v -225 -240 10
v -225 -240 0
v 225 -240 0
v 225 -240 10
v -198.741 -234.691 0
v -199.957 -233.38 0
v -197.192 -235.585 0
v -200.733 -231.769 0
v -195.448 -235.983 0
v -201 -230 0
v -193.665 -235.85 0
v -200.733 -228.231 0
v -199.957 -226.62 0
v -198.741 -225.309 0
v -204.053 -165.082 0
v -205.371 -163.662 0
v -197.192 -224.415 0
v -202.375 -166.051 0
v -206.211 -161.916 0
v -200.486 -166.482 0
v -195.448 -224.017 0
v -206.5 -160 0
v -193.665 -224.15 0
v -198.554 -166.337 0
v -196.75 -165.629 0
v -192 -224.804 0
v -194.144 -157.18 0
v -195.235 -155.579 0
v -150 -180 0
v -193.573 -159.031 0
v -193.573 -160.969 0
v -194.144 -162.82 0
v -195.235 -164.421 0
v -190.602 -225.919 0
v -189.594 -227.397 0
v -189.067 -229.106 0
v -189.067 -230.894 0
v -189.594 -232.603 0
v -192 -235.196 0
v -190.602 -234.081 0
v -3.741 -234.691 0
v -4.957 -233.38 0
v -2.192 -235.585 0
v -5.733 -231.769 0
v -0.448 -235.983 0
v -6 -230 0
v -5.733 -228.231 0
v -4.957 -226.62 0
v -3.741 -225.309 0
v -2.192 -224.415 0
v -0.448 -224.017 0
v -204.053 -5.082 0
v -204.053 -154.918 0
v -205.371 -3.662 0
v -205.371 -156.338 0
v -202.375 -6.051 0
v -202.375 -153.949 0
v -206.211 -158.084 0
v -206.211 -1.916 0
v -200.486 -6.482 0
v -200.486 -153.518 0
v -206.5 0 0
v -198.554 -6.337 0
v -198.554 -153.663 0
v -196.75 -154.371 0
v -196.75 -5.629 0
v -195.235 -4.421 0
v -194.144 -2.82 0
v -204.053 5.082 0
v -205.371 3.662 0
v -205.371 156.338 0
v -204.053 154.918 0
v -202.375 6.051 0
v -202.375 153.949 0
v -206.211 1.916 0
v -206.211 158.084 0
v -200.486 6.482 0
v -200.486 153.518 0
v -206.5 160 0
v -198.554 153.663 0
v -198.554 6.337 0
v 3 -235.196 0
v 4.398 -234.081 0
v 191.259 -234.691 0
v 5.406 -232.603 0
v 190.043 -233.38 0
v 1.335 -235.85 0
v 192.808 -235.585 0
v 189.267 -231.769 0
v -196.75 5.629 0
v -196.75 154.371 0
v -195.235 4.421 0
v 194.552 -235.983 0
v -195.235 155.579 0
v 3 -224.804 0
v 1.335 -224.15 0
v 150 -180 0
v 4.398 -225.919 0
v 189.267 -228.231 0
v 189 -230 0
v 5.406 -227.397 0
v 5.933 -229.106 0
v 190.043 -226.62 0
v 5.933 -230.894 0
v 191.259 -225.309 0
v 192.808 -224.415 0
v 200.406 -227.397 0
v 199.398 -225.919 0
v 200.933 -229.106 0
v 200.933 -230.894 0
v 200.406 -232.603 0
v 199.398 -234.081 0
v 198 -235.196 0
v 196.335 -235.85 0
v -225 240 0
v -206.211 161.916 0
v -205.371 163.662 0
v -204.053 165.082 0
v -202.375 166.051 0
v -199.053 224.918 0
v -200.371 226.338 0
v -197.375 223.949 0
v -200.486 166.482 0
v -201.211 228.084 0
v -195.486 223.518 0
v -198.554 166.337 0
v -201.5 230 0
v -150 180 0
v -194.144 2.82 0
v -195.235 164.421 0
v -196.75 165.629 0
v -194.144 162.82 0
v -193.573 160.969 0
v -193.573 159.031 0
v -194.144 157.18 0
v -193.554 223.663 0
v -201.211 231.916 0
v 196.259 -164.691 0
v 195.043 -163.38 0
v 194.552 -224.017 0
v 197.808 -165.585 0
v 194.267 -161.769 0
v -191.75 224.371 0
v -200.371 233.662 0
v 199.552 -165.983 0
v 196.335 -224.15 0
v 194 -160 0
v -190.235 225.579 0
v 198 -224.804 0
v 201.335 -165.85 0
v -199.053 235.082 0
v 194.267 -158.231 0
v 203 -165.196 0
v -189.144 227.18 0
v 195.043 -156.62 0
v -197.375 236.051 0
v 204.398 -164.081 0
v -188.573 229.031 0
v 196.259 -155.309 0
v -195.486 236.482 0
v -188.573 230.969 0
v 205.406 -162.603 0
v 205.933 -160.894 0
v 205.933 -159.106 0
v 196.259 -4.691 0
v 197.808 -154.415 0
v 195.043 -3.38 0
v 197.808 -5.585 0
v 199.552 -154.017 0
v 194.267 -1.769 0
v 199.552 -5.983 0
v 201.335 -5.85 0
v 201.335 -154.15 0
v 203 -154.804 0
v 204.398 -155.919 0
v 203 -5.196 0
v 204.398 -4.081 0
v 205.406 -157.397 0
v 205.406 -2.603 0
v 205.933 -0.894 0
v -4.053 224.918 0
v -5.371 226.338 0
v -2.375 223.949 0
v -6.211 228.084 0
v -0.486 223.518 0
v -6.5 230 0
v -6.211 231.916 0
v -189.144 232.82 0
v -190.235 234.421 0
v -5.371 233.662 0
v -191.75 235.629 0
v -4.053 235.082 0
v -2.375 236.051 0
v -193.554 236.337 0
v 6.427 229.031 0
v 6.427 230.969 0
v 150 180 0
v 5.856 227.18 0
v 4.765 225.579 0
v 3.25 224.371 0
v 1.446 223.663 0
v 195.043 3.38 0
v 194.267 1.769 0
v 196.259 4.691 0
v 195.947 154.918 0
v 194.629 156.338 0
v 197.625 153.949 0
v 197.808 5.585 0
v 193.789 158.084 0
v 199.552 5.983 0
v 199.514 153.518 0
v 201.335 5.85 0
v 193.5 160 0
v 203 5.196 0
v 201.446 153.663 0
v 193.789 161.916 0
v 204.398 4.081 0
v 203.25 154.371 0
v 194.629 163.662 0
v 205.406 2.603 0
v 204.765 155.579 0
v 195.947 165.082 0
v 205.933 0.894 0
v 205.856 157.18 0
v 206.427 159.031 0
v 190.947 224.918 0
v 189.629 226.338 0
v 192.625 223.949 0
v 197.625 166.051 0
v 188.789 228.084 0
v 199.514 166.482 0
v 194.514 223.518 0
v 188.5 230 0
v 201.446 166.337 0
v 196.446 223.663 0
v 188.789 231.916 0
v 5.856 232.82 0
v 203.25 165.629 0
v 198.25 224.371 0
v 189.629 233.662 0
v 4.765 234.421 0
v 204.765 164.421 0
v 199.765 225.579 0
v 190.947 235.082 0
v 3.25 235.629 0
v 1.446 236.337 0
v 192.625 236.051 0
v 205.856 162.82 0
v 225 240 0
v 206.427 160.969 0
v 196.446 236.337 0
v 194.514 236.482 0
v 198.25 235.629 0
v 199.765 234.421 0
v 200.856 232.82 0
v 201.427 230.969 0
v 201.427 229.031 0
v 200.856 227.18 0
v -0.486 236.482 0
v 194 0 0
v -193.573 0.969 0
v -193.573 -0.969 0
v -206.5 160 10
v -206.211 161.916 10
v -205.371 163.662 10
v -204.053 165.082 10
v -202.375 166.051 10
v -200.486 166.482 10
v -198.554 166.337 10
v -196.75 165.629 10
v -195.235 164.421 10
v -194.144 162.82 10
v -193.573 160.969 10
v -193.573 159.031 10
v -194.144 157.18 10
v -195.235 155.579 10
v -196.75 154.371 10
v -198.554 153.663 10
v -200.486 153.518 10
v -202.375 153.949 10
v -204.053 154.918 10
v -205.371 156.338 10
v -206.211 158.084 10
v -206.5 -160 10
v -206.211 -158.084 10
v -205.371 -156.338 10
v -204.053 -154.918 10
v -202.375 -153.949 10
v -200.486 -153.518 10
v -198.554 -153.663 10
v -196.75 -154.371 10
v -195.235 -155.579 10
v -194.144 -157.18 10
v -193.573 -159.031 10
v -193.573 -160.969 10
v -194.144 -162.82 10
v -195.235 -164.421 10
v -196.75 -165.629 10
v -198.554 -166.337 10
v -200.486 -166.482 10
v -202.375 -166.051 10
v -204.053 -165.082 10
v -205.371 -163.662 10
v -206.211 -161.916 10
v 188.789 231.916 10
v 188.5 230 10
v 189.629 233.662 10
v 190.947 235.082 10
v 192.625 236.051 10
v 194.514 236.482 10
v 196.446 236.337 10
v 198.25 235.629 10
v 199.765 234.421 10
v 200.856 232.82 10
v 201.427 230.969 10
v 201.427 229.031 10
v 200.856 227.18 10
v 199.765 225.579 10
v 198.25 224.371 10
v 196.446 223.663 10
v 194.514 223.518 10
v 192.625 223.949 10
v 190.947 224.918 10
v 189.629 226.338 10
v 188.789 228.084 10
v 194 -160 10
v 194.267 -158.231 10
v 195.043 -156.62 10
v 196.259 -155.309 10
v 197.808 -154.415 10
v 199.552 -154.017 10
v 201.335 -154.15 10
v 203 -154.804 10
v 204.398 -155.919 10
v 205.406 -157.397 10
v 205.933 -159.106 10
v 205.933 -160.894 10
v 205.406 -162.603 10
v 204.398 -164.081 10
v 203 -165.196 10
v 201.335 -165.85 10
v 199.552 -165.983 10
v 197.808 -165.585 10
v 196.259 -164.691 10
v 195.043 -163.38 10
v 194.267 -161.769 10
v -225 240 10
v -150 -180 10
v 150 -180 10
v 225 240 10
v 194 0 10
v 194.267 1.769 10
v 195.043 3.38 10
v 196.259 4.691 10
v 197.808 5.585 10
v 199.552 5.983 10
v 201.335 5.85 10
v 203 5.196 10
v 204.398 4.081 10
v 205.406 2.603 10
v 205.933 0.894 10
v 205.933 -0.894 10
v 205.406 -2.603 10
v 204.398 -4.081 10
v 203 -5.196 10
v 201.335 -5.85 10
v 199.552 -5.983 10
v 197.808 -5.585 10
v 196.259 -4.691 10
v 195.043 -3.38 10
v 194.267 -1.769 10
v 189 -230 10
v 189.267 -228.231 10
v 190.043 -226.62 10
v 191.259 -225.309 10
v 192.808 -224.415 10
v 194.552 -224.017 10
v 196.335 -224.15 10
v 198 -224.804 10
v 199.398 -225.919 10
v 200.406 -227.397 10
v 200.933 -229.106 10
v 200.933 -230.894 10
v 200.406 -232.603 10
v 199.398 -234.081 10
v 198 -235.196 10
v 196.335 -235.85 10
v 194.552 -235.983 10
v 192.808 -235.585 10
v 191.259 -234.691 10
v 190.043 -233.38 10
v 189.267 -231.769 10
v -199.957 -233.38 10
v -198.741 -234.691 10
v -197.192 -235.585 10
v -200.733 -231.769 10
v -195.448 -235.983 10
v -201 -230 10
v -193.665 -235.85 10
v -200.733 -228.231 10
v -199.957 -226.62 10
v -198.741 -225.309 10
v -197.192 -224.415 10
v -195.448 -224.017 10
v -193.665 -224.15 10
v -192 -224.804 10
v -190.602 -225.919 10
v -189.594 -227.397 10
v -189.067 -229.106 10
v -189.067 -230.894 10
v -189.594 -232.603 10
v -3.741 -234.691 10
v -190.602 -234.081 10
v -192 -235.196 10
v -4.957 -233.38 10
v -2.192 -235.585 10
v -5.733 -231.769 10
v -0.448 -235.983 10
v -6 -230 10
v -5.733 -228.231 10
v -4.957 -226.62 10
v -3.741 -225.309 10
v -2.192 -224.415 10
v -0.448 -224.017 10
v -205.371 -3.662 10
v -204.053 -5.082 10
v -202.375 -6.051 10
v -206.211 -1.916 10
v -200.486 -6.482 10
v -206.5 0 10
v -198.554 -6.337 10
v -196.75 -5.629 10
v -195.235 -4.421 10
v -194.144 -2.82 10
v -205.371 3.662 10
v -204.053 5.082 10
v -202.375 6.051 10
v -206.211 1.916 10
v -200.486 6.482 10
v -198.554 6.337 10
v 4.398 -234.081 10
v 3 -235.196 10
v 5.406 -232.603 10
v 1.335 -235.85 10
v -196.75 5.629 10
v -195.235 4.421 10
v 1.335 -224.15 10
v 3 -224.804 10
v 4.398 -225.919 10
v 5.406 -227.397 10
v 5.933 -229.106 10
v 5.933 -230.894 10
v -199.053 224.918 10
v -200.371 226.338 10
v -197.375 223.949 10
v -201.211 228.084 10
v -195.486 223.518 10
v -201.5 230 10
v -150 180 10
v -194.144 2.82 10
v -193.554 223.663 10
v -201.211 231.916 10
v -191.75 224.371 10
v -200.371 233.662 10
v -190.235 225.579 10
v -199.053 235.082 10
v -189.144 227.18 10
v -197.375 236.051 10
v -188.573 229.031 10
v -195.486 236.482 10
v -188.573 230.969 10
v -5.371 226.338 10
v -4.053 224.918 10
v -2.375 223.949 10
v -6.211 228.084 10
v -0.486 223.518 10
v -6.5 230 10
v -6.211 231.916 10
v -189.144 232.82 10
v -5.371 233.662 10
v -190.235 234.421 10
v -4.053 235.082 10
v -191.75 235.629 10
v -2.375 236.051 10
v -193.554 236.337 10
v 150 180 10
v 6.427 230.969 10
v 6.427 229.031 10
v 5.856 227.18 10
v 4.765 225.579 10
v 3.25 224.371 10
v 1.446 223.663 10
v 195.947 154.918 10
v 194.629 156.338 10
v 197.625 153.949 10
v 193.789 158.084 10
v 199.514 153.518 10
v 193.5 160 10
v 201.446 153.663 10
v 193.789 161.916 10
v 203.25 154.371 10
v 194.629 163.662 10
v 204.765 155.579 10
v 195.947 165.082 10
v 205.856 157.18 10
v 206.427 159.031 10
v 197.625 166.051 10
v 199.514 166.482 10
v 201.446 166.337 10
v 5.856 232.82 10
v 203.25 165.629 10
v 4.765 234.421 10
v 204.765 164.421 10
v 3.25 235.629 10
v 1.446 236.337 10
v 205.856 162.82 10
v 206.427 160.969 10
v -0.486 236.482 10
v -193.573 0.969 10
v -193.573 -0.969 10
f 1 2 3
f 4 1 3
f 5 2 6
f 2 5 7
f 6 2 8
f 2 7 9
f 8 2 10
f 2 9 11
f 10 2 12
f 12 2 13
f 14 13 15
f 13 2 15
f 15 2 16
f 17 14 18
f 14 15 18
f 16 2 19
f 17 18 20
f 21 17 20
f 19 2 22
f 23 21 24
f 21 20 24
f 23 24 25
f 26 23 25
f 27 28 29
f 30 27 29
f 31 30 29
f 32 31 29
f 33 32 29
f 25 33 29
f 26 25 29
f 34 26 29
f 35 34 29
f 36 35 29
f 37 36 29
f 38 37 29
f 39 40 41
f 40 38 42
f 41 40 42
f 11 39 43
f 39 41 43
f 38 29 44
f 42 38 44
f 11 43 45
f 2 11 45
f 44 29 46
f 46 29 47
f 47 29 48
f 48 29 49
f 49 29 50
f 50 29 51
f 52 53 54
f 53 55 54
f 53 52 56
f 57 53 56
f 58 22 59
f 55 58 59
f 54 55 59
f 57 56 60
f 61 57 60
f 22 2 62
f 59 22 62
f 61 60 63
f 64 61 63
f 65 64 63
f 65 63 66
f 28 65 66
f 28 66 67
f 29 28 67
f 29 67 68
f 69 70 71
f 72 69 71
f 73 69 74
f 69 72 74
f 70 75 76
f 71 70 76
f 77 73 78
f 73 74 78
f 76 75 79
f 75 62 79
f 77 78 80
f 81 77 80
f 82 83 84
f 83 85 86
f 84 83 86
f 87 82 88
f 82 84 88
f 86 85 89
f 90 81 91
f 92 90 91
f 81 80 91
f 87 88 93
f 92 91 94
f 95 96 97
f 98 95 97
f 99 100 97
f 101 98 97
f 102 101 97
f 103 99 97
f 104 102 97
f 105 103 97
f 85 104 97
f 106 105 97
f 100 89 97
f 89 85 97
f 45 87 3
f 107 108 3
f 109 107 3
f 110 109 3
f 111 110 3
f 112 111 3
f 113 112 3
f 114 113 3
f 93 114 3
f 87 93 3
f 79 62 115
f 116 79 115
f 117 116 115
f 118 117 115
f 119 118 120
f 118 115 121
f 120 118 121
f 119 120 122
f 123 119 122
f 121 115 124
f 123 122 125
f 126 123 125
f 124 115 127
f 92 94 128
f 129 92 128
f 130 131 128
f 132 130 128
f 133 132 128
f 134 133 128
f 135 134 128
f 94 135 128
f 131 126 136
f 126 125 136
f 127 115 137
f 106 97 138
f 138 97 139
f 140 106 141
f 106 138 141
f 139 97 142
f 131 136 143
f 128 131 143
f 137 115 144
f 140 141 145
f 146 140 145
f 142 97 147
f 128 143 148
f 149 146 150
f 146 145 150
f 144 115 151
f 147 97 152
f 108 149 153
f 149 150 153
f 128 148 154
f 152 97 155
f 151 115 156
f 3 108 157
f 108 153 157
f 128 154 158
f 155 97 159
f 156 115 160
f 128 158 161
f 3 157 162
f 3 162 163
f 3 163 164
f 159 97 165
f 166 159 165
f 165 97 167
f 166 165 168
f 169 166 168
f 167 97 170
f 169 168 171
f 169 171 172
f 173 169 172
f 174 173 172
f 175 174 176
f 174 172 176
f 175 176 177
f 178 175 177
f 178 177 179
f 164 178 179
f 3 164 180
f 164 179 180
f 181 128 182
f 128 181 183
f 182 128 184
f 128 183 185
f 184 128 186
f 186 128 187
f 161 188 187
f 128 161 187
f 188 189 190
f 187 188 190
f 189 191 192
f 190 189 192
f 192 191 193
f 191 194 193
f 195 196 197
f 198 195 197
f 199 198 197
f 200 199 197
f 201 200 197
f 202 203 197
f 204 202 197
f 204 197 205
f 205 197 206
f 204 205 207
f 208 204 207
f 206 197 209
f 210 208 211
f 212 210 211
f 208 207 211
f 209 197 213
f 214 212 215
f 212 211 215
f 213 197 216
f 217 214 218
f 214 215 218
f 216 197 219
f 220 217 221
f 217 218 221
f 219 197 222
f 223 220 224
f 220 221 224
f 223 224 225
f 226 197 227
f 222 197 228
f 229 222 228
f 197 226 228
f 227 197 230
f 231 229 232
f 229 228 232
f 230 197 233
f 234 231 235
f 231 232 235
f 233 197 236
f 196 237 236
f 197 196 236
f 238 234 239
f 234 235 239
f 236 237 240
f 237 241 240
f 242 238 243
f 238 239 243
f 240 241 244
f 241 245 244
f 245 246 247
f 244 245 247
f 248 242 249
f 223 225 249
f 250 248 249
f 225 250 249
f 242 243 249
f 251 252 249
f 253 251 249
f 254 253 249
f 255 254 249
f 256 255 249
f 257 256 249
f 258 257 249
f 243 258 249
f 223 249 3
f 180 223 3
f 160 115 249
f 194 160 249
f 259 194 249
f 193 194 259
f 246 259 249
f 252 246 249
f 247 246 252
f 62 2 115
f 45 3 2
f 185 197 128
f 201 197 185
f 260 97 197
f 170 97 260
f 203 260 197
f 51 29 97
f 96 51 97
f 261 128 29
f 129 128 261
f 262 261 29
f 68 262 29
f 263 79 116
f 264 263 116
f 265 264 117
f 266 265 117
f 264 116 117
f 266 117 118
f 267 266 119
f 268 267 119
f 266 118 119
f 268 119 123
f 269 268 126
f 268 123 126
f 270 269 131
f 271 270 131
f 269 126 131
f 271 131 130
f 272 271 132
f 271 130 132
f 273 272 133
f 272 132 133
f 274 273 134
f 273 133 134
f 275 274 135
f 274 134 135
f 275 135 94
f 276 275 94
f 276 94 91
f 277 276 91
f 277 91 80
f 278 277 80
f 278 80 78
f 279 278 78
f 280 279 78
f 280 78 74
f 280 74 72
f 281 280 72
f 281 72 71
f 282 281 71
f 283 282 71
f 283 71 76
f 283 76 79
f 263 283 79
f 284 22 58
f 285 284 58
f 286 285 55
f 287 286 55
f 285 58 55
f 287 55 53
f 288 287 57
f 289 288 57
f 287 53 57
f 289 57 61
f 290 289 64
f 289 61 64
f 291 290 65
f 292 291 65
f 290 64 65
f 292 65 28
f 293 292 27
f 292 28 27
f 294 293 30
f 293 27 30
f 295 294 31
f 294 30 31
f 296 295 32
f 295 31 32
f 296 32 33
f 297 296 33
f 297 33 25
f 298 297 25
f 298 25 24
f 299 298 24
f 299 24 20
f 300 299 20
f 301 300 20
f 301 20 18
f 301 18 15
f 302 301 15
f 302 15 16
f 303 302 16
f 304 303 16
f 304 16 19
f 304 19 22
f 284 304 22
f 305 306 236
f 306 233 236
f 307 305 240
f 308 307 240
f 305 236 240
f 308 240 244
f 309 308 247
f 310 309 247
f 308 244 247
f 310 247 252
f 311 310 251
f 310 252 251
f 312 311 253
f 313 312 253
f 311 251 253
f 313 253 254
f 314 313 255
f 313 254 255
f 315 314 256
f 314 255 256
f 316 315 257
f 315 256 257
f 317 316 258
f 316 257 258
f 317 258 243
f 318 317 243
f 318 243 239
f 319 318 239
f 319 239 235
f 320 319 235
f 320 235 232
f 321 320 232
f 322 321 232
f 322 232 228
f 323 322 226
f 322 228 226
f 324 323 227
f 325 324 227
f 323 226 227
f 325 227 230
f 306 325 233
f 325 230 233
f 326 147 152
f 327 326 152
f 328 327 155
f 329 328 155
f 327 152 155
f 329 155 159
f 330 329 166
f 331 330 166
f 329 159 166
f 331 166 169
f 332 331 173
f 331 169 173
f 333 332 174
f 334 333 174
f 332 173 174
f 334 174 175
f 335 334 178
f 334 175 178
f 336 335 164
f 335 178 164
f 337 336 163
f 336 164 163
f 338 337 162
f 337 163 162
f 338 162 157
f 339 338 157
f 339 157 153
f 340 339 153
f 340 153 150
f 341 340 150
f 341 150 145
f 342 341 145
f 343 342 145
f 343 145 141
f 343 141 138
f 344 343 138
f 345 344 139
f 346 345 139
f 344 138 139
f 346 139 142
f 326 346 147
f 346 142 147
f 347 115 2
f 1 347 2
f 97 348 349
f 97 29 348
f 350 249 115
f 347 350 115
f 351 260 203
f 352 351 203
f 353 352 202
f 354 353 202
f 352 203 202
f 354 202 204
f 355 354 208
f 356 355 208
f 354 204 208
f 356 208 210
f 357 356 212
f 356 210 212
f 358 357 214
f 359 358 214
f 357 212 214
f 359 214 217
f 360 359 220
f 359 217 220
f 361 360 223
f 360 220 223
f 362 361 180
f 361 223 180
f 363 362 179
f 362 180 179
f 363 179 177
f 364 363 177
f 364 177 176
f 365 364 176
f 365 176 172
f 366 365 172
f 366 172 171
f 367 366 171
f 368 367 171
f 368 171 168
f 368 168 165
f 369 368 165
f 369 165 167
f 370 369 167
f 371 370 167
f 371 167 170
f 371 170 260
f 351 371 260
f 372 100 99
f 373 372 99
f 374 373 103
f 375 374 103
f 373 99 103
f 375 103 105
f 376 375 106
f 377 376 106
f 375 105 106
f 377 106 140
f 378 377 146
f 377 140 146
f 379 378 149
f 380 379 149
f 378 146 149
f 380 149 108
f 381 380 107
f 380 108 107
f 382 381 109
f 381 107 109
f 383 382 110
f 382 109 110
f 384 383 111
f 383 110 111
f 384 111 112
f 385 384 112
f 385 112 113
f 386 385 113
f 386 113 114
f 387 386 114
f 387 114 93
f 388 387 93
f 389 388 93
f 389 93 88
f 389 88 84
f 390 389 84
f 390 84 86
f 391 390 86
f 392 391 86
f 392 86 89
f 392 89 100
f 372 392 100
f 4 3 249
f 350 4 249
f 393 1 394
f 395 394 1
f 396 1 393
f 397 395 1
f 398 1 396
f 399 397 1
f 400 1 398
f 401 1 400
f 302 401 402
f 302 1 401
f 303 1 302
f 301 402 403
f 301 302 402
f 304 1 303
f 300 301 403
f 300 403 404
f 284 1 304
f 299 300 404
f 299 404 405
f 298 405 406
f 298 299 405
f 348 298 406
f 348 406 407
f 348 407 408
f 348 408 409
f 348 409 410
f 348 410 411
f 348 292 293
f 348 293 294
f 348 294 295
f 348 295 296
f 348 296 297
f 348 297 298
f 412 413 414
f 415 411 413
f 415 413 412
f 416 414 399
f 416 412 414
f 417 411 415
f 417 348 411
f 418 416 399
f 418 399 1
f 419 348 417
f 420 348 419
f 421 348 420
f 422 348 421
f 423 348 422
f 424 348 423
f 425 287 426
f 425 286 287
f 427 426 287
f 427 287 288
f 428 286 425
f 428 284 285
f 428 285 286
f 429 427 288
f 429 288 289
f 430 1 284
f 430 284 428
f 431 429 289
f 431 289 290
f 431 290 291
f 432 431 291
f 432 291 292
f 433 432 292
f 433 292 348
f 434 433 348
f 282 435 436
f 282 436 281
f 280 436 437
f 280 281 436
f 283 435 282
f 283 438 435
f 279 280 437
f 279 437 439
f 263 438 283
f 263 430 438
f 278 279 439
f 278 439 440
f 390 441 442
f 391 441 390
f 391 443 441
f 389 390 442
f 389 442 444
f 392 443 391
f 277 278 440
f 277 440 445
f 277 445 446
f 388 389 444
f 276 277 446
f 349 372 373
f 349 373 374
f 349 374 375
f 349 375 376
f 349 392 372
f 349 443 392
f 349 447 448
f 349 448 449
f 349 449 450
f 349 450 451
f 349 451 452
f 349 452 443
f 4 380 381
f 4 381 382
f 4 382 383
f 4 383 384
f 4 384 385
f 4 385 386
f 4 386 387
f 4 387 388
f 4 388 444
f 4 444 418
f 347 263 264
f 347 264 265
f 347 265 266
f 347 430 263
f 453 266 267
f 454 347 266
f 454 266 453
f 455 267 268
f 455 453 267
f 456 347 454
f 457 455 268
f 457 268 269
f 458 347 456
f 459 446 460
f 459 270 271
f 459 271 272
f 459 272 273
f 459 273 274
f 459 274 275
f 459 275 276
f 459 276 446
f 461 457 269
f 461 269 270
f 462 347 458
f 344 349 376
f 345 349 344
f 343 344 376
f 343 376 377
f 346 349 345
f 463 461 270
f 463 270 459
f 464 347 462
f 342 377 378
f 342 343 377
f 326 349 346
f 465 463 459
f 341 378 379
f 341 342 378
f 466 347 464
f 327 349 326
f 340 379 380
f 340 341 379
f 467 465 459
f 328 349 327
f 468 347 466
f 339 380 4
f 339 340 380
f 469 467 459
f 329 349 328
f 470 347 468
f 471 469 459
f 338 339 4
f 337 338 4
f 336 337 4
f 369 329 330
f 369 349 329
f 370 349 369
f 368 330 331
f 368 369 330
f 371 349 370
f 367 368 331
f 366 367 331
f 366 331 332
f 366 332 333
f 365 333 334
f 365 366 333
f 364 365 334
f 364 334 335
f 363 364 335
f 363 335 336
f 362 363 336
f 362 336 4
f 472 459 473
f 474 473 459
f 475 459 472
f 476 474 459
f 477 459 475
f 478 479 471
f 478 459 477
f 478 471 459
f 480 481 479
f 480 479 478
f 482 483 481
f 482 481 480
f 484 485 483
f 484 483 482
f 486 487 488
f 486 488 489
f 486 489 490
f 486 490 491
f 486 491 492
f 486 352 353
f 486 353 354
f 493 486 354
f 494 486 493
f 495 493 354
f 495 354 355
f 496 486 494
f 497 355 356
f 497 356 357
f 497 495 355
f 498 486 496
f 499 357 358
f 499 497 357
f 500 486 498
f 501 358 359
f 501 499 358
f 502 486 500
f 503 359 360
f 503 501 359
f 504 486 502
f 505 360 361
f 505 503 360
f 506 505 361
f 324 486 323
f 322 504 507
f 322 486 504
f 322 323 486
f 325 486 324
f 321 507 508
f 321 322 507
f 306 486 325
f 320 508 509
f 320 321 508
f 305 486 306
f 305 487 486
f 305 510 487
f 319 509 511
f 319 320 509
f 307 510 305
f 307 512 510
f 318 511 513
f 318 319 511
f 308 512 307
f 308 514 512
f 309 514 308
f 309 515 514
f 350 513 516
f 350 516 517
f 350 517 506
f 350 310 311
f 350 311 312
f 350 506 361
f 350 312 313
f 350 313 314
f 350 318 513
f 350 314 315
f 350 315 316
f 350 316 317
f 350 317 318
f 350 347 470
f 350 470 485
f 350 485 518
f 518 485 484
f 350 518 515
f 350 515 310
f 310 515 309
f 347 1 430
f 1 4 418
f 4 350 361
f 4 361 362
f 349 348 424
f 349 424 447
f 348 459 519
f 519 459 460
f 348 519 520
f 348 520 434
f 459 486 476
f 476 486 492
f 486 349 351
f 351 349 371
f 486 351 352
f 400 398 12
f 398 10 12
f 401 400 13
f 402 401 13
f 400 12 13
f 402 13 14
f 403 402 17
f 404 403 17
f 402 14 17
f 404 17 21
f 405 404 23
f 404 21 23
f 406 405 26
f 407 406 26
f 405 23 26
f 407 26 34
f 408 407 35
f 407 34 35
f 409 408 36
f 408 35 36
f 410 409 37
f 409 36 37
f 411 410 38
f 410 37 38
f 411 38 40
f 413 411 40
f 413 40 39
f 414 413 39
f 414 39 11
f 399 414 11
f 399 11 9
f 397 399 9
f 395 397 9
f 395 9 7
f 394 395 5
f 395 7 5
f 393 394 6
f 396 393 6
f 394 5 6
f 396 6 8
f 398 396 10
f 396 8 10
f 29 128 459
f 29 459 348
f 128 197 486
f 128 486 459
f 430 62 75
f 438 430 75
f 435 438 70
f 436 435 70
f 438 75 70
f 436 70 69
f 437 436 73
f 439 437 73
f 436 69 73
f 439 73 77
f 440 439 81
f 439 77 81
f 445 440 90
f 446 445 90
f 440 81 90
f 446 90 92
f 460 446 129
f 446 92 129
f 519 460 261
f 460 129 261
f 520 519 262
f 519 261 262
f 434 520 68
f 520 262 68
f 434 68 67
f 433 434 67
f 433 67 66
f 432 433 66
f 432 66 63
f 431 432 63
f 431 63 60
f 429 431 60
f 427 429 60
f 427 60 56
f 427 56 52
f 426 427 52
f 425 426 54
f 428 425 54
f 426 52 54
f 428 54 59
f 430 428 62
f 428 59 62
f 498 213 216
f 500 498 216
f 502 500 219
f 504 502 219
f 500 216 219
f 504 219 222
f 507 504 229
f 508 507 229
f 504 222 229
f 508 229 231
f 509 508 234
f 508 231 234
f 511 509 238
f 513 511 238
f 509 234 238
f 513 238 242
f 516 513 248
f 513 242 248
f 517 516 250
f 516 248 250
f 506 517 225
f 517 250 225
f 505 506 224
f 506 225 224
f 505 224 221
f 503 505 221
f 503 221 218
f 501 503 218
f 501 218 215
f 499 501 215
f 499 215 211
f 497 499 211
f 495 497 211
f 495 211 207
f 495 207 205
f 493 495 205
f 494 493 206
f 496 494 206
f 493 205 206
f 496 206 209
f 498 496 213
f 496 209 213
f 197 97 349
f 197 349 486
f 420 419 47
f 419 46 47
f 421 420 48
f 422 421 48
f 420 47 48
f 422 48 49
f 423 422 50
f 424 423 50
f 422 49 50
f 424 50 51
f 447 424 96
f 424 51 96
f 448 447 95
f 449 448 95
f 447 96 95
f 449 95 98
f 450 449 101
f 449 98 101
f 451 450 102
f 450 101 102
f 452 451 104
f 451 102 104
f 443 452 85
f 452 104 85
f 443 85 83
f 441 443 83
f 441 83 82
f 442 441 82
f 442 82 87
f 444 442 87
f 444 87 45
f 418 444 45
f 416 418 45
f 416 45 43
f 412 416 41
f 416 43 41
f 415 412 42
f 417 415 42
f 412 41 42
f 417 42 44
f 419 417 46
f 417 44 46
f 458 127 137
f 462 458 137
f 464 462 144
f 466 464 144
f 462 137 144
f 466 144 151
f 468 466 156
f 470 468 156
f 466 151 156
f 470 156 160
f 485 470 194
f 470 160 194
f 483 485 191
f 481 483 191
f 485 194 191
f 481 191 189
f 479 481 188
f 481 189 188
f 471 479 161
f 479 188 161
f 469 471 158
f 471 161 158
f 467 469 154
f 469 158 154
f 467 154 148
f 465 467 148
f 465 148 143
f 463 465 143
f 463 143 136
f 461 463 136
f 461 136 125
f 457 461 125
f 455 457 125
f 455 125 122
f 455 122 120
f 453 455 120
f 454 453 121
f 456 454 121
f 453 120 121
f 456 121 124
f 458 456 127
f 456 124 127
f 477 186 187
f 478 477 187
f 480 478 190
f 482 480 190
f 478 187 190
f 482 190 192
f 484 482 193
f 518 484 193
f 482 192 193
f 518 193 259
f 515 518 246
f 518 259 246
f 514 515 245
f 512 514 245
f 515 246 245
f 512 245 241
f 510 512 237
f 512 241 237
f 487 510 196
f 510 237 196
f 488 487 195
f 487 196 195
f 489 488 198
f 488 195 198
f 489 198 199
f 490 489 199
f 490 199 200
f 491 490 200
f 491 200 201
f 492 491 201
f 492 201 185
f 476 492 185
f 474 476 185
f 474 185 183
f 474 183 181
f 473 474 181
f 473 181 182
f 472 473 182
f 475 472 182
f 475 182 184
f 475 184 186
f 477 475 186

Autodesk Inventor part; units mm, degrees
ref_plane "YZ Plane" through (0, 0, 0) normal (1, 0, 0) x (0, 1, 0)
ref_plane "XZ Plane" through (0, 0, 0) normal (0, 1, 0) x (-1, 0, 0)
ref_plane "XY Plane" through (0, 0, 0) normal (0, 0, 1) x (1, 0, 0)
sketch "Sketch3" plane through (0, 0, 0) normal (0, 0, 1) x (1, 0, 0)
  line L0 (225, 240) -> (-225, 240)
  line L1 (-225, 240) -> (-225, -240)
  line L2 (-225, -240) -> (225, -240)
  line L3 (225, -240) -> (225, 240)
  line L4 (225, 240) -> (-225, -240) construction
  line L5 (-225, 240) -> (225, -240) construction
  line L6 (150, 180) -> (-150, 180)
  line L7 (-150, 180) -> (-150, -180)
  line L8 (-150, -180) -> (150, -180)
  line L9 (150, -180) -> (150, 180)
  line L10 (150, 180) -> (-150, -180) construction
  line L11 (-150, 180) -> (150, -180) construction
  point P0 (0, 0)
  dimension "d22" = 450
  dimension "d23" = 480
  dimension "d24" = 300
  dimension "d25" = 360
extrude "Plate3" add sketch "Sketch3" along normal blind 10
sketch "Sketch4" plane through (0, 0, 0) normal (0, 0, -1) x (-1, 0, 0)
  circle A0 centre (0, 230) radius 6.5 projected
  circle A1 centre (195, 230) radius 6.5 projected
  circle A2 centre (-195, 230) radius 6.5 projected
  circle A3 centre (-200, 160) radius 6.5 projected
  circle A4 centre (-200, 0) radius 6 projected
  circle A5 centre (-200, -160) radius 6 projected
  circle A6 centre (-195, -230) radius 6 projected
  circle A7 centre (0, -230) radius 6 projected
  circle A8 centre (195, -230) radius 6 projected
  circle A9 centre (200, -160) radius 6.5 projected
  circle A10 centre (200, 0) radius 6.5 projected
  circle A11 centre (200, 160) radius 6.5 projected
  point P0 (0, 0)
extrude "Cut1" cut sketch "Sketch4" against normal blind 10
equation "\"d26\" = Thickness"
equation "\"d18\" = Thickness"
equation "\"BendReliefDepth\" = 0.5 * Thickness"
equation "\"Thickness\" = 10"
properties part number "NVPH-305 main flange"
